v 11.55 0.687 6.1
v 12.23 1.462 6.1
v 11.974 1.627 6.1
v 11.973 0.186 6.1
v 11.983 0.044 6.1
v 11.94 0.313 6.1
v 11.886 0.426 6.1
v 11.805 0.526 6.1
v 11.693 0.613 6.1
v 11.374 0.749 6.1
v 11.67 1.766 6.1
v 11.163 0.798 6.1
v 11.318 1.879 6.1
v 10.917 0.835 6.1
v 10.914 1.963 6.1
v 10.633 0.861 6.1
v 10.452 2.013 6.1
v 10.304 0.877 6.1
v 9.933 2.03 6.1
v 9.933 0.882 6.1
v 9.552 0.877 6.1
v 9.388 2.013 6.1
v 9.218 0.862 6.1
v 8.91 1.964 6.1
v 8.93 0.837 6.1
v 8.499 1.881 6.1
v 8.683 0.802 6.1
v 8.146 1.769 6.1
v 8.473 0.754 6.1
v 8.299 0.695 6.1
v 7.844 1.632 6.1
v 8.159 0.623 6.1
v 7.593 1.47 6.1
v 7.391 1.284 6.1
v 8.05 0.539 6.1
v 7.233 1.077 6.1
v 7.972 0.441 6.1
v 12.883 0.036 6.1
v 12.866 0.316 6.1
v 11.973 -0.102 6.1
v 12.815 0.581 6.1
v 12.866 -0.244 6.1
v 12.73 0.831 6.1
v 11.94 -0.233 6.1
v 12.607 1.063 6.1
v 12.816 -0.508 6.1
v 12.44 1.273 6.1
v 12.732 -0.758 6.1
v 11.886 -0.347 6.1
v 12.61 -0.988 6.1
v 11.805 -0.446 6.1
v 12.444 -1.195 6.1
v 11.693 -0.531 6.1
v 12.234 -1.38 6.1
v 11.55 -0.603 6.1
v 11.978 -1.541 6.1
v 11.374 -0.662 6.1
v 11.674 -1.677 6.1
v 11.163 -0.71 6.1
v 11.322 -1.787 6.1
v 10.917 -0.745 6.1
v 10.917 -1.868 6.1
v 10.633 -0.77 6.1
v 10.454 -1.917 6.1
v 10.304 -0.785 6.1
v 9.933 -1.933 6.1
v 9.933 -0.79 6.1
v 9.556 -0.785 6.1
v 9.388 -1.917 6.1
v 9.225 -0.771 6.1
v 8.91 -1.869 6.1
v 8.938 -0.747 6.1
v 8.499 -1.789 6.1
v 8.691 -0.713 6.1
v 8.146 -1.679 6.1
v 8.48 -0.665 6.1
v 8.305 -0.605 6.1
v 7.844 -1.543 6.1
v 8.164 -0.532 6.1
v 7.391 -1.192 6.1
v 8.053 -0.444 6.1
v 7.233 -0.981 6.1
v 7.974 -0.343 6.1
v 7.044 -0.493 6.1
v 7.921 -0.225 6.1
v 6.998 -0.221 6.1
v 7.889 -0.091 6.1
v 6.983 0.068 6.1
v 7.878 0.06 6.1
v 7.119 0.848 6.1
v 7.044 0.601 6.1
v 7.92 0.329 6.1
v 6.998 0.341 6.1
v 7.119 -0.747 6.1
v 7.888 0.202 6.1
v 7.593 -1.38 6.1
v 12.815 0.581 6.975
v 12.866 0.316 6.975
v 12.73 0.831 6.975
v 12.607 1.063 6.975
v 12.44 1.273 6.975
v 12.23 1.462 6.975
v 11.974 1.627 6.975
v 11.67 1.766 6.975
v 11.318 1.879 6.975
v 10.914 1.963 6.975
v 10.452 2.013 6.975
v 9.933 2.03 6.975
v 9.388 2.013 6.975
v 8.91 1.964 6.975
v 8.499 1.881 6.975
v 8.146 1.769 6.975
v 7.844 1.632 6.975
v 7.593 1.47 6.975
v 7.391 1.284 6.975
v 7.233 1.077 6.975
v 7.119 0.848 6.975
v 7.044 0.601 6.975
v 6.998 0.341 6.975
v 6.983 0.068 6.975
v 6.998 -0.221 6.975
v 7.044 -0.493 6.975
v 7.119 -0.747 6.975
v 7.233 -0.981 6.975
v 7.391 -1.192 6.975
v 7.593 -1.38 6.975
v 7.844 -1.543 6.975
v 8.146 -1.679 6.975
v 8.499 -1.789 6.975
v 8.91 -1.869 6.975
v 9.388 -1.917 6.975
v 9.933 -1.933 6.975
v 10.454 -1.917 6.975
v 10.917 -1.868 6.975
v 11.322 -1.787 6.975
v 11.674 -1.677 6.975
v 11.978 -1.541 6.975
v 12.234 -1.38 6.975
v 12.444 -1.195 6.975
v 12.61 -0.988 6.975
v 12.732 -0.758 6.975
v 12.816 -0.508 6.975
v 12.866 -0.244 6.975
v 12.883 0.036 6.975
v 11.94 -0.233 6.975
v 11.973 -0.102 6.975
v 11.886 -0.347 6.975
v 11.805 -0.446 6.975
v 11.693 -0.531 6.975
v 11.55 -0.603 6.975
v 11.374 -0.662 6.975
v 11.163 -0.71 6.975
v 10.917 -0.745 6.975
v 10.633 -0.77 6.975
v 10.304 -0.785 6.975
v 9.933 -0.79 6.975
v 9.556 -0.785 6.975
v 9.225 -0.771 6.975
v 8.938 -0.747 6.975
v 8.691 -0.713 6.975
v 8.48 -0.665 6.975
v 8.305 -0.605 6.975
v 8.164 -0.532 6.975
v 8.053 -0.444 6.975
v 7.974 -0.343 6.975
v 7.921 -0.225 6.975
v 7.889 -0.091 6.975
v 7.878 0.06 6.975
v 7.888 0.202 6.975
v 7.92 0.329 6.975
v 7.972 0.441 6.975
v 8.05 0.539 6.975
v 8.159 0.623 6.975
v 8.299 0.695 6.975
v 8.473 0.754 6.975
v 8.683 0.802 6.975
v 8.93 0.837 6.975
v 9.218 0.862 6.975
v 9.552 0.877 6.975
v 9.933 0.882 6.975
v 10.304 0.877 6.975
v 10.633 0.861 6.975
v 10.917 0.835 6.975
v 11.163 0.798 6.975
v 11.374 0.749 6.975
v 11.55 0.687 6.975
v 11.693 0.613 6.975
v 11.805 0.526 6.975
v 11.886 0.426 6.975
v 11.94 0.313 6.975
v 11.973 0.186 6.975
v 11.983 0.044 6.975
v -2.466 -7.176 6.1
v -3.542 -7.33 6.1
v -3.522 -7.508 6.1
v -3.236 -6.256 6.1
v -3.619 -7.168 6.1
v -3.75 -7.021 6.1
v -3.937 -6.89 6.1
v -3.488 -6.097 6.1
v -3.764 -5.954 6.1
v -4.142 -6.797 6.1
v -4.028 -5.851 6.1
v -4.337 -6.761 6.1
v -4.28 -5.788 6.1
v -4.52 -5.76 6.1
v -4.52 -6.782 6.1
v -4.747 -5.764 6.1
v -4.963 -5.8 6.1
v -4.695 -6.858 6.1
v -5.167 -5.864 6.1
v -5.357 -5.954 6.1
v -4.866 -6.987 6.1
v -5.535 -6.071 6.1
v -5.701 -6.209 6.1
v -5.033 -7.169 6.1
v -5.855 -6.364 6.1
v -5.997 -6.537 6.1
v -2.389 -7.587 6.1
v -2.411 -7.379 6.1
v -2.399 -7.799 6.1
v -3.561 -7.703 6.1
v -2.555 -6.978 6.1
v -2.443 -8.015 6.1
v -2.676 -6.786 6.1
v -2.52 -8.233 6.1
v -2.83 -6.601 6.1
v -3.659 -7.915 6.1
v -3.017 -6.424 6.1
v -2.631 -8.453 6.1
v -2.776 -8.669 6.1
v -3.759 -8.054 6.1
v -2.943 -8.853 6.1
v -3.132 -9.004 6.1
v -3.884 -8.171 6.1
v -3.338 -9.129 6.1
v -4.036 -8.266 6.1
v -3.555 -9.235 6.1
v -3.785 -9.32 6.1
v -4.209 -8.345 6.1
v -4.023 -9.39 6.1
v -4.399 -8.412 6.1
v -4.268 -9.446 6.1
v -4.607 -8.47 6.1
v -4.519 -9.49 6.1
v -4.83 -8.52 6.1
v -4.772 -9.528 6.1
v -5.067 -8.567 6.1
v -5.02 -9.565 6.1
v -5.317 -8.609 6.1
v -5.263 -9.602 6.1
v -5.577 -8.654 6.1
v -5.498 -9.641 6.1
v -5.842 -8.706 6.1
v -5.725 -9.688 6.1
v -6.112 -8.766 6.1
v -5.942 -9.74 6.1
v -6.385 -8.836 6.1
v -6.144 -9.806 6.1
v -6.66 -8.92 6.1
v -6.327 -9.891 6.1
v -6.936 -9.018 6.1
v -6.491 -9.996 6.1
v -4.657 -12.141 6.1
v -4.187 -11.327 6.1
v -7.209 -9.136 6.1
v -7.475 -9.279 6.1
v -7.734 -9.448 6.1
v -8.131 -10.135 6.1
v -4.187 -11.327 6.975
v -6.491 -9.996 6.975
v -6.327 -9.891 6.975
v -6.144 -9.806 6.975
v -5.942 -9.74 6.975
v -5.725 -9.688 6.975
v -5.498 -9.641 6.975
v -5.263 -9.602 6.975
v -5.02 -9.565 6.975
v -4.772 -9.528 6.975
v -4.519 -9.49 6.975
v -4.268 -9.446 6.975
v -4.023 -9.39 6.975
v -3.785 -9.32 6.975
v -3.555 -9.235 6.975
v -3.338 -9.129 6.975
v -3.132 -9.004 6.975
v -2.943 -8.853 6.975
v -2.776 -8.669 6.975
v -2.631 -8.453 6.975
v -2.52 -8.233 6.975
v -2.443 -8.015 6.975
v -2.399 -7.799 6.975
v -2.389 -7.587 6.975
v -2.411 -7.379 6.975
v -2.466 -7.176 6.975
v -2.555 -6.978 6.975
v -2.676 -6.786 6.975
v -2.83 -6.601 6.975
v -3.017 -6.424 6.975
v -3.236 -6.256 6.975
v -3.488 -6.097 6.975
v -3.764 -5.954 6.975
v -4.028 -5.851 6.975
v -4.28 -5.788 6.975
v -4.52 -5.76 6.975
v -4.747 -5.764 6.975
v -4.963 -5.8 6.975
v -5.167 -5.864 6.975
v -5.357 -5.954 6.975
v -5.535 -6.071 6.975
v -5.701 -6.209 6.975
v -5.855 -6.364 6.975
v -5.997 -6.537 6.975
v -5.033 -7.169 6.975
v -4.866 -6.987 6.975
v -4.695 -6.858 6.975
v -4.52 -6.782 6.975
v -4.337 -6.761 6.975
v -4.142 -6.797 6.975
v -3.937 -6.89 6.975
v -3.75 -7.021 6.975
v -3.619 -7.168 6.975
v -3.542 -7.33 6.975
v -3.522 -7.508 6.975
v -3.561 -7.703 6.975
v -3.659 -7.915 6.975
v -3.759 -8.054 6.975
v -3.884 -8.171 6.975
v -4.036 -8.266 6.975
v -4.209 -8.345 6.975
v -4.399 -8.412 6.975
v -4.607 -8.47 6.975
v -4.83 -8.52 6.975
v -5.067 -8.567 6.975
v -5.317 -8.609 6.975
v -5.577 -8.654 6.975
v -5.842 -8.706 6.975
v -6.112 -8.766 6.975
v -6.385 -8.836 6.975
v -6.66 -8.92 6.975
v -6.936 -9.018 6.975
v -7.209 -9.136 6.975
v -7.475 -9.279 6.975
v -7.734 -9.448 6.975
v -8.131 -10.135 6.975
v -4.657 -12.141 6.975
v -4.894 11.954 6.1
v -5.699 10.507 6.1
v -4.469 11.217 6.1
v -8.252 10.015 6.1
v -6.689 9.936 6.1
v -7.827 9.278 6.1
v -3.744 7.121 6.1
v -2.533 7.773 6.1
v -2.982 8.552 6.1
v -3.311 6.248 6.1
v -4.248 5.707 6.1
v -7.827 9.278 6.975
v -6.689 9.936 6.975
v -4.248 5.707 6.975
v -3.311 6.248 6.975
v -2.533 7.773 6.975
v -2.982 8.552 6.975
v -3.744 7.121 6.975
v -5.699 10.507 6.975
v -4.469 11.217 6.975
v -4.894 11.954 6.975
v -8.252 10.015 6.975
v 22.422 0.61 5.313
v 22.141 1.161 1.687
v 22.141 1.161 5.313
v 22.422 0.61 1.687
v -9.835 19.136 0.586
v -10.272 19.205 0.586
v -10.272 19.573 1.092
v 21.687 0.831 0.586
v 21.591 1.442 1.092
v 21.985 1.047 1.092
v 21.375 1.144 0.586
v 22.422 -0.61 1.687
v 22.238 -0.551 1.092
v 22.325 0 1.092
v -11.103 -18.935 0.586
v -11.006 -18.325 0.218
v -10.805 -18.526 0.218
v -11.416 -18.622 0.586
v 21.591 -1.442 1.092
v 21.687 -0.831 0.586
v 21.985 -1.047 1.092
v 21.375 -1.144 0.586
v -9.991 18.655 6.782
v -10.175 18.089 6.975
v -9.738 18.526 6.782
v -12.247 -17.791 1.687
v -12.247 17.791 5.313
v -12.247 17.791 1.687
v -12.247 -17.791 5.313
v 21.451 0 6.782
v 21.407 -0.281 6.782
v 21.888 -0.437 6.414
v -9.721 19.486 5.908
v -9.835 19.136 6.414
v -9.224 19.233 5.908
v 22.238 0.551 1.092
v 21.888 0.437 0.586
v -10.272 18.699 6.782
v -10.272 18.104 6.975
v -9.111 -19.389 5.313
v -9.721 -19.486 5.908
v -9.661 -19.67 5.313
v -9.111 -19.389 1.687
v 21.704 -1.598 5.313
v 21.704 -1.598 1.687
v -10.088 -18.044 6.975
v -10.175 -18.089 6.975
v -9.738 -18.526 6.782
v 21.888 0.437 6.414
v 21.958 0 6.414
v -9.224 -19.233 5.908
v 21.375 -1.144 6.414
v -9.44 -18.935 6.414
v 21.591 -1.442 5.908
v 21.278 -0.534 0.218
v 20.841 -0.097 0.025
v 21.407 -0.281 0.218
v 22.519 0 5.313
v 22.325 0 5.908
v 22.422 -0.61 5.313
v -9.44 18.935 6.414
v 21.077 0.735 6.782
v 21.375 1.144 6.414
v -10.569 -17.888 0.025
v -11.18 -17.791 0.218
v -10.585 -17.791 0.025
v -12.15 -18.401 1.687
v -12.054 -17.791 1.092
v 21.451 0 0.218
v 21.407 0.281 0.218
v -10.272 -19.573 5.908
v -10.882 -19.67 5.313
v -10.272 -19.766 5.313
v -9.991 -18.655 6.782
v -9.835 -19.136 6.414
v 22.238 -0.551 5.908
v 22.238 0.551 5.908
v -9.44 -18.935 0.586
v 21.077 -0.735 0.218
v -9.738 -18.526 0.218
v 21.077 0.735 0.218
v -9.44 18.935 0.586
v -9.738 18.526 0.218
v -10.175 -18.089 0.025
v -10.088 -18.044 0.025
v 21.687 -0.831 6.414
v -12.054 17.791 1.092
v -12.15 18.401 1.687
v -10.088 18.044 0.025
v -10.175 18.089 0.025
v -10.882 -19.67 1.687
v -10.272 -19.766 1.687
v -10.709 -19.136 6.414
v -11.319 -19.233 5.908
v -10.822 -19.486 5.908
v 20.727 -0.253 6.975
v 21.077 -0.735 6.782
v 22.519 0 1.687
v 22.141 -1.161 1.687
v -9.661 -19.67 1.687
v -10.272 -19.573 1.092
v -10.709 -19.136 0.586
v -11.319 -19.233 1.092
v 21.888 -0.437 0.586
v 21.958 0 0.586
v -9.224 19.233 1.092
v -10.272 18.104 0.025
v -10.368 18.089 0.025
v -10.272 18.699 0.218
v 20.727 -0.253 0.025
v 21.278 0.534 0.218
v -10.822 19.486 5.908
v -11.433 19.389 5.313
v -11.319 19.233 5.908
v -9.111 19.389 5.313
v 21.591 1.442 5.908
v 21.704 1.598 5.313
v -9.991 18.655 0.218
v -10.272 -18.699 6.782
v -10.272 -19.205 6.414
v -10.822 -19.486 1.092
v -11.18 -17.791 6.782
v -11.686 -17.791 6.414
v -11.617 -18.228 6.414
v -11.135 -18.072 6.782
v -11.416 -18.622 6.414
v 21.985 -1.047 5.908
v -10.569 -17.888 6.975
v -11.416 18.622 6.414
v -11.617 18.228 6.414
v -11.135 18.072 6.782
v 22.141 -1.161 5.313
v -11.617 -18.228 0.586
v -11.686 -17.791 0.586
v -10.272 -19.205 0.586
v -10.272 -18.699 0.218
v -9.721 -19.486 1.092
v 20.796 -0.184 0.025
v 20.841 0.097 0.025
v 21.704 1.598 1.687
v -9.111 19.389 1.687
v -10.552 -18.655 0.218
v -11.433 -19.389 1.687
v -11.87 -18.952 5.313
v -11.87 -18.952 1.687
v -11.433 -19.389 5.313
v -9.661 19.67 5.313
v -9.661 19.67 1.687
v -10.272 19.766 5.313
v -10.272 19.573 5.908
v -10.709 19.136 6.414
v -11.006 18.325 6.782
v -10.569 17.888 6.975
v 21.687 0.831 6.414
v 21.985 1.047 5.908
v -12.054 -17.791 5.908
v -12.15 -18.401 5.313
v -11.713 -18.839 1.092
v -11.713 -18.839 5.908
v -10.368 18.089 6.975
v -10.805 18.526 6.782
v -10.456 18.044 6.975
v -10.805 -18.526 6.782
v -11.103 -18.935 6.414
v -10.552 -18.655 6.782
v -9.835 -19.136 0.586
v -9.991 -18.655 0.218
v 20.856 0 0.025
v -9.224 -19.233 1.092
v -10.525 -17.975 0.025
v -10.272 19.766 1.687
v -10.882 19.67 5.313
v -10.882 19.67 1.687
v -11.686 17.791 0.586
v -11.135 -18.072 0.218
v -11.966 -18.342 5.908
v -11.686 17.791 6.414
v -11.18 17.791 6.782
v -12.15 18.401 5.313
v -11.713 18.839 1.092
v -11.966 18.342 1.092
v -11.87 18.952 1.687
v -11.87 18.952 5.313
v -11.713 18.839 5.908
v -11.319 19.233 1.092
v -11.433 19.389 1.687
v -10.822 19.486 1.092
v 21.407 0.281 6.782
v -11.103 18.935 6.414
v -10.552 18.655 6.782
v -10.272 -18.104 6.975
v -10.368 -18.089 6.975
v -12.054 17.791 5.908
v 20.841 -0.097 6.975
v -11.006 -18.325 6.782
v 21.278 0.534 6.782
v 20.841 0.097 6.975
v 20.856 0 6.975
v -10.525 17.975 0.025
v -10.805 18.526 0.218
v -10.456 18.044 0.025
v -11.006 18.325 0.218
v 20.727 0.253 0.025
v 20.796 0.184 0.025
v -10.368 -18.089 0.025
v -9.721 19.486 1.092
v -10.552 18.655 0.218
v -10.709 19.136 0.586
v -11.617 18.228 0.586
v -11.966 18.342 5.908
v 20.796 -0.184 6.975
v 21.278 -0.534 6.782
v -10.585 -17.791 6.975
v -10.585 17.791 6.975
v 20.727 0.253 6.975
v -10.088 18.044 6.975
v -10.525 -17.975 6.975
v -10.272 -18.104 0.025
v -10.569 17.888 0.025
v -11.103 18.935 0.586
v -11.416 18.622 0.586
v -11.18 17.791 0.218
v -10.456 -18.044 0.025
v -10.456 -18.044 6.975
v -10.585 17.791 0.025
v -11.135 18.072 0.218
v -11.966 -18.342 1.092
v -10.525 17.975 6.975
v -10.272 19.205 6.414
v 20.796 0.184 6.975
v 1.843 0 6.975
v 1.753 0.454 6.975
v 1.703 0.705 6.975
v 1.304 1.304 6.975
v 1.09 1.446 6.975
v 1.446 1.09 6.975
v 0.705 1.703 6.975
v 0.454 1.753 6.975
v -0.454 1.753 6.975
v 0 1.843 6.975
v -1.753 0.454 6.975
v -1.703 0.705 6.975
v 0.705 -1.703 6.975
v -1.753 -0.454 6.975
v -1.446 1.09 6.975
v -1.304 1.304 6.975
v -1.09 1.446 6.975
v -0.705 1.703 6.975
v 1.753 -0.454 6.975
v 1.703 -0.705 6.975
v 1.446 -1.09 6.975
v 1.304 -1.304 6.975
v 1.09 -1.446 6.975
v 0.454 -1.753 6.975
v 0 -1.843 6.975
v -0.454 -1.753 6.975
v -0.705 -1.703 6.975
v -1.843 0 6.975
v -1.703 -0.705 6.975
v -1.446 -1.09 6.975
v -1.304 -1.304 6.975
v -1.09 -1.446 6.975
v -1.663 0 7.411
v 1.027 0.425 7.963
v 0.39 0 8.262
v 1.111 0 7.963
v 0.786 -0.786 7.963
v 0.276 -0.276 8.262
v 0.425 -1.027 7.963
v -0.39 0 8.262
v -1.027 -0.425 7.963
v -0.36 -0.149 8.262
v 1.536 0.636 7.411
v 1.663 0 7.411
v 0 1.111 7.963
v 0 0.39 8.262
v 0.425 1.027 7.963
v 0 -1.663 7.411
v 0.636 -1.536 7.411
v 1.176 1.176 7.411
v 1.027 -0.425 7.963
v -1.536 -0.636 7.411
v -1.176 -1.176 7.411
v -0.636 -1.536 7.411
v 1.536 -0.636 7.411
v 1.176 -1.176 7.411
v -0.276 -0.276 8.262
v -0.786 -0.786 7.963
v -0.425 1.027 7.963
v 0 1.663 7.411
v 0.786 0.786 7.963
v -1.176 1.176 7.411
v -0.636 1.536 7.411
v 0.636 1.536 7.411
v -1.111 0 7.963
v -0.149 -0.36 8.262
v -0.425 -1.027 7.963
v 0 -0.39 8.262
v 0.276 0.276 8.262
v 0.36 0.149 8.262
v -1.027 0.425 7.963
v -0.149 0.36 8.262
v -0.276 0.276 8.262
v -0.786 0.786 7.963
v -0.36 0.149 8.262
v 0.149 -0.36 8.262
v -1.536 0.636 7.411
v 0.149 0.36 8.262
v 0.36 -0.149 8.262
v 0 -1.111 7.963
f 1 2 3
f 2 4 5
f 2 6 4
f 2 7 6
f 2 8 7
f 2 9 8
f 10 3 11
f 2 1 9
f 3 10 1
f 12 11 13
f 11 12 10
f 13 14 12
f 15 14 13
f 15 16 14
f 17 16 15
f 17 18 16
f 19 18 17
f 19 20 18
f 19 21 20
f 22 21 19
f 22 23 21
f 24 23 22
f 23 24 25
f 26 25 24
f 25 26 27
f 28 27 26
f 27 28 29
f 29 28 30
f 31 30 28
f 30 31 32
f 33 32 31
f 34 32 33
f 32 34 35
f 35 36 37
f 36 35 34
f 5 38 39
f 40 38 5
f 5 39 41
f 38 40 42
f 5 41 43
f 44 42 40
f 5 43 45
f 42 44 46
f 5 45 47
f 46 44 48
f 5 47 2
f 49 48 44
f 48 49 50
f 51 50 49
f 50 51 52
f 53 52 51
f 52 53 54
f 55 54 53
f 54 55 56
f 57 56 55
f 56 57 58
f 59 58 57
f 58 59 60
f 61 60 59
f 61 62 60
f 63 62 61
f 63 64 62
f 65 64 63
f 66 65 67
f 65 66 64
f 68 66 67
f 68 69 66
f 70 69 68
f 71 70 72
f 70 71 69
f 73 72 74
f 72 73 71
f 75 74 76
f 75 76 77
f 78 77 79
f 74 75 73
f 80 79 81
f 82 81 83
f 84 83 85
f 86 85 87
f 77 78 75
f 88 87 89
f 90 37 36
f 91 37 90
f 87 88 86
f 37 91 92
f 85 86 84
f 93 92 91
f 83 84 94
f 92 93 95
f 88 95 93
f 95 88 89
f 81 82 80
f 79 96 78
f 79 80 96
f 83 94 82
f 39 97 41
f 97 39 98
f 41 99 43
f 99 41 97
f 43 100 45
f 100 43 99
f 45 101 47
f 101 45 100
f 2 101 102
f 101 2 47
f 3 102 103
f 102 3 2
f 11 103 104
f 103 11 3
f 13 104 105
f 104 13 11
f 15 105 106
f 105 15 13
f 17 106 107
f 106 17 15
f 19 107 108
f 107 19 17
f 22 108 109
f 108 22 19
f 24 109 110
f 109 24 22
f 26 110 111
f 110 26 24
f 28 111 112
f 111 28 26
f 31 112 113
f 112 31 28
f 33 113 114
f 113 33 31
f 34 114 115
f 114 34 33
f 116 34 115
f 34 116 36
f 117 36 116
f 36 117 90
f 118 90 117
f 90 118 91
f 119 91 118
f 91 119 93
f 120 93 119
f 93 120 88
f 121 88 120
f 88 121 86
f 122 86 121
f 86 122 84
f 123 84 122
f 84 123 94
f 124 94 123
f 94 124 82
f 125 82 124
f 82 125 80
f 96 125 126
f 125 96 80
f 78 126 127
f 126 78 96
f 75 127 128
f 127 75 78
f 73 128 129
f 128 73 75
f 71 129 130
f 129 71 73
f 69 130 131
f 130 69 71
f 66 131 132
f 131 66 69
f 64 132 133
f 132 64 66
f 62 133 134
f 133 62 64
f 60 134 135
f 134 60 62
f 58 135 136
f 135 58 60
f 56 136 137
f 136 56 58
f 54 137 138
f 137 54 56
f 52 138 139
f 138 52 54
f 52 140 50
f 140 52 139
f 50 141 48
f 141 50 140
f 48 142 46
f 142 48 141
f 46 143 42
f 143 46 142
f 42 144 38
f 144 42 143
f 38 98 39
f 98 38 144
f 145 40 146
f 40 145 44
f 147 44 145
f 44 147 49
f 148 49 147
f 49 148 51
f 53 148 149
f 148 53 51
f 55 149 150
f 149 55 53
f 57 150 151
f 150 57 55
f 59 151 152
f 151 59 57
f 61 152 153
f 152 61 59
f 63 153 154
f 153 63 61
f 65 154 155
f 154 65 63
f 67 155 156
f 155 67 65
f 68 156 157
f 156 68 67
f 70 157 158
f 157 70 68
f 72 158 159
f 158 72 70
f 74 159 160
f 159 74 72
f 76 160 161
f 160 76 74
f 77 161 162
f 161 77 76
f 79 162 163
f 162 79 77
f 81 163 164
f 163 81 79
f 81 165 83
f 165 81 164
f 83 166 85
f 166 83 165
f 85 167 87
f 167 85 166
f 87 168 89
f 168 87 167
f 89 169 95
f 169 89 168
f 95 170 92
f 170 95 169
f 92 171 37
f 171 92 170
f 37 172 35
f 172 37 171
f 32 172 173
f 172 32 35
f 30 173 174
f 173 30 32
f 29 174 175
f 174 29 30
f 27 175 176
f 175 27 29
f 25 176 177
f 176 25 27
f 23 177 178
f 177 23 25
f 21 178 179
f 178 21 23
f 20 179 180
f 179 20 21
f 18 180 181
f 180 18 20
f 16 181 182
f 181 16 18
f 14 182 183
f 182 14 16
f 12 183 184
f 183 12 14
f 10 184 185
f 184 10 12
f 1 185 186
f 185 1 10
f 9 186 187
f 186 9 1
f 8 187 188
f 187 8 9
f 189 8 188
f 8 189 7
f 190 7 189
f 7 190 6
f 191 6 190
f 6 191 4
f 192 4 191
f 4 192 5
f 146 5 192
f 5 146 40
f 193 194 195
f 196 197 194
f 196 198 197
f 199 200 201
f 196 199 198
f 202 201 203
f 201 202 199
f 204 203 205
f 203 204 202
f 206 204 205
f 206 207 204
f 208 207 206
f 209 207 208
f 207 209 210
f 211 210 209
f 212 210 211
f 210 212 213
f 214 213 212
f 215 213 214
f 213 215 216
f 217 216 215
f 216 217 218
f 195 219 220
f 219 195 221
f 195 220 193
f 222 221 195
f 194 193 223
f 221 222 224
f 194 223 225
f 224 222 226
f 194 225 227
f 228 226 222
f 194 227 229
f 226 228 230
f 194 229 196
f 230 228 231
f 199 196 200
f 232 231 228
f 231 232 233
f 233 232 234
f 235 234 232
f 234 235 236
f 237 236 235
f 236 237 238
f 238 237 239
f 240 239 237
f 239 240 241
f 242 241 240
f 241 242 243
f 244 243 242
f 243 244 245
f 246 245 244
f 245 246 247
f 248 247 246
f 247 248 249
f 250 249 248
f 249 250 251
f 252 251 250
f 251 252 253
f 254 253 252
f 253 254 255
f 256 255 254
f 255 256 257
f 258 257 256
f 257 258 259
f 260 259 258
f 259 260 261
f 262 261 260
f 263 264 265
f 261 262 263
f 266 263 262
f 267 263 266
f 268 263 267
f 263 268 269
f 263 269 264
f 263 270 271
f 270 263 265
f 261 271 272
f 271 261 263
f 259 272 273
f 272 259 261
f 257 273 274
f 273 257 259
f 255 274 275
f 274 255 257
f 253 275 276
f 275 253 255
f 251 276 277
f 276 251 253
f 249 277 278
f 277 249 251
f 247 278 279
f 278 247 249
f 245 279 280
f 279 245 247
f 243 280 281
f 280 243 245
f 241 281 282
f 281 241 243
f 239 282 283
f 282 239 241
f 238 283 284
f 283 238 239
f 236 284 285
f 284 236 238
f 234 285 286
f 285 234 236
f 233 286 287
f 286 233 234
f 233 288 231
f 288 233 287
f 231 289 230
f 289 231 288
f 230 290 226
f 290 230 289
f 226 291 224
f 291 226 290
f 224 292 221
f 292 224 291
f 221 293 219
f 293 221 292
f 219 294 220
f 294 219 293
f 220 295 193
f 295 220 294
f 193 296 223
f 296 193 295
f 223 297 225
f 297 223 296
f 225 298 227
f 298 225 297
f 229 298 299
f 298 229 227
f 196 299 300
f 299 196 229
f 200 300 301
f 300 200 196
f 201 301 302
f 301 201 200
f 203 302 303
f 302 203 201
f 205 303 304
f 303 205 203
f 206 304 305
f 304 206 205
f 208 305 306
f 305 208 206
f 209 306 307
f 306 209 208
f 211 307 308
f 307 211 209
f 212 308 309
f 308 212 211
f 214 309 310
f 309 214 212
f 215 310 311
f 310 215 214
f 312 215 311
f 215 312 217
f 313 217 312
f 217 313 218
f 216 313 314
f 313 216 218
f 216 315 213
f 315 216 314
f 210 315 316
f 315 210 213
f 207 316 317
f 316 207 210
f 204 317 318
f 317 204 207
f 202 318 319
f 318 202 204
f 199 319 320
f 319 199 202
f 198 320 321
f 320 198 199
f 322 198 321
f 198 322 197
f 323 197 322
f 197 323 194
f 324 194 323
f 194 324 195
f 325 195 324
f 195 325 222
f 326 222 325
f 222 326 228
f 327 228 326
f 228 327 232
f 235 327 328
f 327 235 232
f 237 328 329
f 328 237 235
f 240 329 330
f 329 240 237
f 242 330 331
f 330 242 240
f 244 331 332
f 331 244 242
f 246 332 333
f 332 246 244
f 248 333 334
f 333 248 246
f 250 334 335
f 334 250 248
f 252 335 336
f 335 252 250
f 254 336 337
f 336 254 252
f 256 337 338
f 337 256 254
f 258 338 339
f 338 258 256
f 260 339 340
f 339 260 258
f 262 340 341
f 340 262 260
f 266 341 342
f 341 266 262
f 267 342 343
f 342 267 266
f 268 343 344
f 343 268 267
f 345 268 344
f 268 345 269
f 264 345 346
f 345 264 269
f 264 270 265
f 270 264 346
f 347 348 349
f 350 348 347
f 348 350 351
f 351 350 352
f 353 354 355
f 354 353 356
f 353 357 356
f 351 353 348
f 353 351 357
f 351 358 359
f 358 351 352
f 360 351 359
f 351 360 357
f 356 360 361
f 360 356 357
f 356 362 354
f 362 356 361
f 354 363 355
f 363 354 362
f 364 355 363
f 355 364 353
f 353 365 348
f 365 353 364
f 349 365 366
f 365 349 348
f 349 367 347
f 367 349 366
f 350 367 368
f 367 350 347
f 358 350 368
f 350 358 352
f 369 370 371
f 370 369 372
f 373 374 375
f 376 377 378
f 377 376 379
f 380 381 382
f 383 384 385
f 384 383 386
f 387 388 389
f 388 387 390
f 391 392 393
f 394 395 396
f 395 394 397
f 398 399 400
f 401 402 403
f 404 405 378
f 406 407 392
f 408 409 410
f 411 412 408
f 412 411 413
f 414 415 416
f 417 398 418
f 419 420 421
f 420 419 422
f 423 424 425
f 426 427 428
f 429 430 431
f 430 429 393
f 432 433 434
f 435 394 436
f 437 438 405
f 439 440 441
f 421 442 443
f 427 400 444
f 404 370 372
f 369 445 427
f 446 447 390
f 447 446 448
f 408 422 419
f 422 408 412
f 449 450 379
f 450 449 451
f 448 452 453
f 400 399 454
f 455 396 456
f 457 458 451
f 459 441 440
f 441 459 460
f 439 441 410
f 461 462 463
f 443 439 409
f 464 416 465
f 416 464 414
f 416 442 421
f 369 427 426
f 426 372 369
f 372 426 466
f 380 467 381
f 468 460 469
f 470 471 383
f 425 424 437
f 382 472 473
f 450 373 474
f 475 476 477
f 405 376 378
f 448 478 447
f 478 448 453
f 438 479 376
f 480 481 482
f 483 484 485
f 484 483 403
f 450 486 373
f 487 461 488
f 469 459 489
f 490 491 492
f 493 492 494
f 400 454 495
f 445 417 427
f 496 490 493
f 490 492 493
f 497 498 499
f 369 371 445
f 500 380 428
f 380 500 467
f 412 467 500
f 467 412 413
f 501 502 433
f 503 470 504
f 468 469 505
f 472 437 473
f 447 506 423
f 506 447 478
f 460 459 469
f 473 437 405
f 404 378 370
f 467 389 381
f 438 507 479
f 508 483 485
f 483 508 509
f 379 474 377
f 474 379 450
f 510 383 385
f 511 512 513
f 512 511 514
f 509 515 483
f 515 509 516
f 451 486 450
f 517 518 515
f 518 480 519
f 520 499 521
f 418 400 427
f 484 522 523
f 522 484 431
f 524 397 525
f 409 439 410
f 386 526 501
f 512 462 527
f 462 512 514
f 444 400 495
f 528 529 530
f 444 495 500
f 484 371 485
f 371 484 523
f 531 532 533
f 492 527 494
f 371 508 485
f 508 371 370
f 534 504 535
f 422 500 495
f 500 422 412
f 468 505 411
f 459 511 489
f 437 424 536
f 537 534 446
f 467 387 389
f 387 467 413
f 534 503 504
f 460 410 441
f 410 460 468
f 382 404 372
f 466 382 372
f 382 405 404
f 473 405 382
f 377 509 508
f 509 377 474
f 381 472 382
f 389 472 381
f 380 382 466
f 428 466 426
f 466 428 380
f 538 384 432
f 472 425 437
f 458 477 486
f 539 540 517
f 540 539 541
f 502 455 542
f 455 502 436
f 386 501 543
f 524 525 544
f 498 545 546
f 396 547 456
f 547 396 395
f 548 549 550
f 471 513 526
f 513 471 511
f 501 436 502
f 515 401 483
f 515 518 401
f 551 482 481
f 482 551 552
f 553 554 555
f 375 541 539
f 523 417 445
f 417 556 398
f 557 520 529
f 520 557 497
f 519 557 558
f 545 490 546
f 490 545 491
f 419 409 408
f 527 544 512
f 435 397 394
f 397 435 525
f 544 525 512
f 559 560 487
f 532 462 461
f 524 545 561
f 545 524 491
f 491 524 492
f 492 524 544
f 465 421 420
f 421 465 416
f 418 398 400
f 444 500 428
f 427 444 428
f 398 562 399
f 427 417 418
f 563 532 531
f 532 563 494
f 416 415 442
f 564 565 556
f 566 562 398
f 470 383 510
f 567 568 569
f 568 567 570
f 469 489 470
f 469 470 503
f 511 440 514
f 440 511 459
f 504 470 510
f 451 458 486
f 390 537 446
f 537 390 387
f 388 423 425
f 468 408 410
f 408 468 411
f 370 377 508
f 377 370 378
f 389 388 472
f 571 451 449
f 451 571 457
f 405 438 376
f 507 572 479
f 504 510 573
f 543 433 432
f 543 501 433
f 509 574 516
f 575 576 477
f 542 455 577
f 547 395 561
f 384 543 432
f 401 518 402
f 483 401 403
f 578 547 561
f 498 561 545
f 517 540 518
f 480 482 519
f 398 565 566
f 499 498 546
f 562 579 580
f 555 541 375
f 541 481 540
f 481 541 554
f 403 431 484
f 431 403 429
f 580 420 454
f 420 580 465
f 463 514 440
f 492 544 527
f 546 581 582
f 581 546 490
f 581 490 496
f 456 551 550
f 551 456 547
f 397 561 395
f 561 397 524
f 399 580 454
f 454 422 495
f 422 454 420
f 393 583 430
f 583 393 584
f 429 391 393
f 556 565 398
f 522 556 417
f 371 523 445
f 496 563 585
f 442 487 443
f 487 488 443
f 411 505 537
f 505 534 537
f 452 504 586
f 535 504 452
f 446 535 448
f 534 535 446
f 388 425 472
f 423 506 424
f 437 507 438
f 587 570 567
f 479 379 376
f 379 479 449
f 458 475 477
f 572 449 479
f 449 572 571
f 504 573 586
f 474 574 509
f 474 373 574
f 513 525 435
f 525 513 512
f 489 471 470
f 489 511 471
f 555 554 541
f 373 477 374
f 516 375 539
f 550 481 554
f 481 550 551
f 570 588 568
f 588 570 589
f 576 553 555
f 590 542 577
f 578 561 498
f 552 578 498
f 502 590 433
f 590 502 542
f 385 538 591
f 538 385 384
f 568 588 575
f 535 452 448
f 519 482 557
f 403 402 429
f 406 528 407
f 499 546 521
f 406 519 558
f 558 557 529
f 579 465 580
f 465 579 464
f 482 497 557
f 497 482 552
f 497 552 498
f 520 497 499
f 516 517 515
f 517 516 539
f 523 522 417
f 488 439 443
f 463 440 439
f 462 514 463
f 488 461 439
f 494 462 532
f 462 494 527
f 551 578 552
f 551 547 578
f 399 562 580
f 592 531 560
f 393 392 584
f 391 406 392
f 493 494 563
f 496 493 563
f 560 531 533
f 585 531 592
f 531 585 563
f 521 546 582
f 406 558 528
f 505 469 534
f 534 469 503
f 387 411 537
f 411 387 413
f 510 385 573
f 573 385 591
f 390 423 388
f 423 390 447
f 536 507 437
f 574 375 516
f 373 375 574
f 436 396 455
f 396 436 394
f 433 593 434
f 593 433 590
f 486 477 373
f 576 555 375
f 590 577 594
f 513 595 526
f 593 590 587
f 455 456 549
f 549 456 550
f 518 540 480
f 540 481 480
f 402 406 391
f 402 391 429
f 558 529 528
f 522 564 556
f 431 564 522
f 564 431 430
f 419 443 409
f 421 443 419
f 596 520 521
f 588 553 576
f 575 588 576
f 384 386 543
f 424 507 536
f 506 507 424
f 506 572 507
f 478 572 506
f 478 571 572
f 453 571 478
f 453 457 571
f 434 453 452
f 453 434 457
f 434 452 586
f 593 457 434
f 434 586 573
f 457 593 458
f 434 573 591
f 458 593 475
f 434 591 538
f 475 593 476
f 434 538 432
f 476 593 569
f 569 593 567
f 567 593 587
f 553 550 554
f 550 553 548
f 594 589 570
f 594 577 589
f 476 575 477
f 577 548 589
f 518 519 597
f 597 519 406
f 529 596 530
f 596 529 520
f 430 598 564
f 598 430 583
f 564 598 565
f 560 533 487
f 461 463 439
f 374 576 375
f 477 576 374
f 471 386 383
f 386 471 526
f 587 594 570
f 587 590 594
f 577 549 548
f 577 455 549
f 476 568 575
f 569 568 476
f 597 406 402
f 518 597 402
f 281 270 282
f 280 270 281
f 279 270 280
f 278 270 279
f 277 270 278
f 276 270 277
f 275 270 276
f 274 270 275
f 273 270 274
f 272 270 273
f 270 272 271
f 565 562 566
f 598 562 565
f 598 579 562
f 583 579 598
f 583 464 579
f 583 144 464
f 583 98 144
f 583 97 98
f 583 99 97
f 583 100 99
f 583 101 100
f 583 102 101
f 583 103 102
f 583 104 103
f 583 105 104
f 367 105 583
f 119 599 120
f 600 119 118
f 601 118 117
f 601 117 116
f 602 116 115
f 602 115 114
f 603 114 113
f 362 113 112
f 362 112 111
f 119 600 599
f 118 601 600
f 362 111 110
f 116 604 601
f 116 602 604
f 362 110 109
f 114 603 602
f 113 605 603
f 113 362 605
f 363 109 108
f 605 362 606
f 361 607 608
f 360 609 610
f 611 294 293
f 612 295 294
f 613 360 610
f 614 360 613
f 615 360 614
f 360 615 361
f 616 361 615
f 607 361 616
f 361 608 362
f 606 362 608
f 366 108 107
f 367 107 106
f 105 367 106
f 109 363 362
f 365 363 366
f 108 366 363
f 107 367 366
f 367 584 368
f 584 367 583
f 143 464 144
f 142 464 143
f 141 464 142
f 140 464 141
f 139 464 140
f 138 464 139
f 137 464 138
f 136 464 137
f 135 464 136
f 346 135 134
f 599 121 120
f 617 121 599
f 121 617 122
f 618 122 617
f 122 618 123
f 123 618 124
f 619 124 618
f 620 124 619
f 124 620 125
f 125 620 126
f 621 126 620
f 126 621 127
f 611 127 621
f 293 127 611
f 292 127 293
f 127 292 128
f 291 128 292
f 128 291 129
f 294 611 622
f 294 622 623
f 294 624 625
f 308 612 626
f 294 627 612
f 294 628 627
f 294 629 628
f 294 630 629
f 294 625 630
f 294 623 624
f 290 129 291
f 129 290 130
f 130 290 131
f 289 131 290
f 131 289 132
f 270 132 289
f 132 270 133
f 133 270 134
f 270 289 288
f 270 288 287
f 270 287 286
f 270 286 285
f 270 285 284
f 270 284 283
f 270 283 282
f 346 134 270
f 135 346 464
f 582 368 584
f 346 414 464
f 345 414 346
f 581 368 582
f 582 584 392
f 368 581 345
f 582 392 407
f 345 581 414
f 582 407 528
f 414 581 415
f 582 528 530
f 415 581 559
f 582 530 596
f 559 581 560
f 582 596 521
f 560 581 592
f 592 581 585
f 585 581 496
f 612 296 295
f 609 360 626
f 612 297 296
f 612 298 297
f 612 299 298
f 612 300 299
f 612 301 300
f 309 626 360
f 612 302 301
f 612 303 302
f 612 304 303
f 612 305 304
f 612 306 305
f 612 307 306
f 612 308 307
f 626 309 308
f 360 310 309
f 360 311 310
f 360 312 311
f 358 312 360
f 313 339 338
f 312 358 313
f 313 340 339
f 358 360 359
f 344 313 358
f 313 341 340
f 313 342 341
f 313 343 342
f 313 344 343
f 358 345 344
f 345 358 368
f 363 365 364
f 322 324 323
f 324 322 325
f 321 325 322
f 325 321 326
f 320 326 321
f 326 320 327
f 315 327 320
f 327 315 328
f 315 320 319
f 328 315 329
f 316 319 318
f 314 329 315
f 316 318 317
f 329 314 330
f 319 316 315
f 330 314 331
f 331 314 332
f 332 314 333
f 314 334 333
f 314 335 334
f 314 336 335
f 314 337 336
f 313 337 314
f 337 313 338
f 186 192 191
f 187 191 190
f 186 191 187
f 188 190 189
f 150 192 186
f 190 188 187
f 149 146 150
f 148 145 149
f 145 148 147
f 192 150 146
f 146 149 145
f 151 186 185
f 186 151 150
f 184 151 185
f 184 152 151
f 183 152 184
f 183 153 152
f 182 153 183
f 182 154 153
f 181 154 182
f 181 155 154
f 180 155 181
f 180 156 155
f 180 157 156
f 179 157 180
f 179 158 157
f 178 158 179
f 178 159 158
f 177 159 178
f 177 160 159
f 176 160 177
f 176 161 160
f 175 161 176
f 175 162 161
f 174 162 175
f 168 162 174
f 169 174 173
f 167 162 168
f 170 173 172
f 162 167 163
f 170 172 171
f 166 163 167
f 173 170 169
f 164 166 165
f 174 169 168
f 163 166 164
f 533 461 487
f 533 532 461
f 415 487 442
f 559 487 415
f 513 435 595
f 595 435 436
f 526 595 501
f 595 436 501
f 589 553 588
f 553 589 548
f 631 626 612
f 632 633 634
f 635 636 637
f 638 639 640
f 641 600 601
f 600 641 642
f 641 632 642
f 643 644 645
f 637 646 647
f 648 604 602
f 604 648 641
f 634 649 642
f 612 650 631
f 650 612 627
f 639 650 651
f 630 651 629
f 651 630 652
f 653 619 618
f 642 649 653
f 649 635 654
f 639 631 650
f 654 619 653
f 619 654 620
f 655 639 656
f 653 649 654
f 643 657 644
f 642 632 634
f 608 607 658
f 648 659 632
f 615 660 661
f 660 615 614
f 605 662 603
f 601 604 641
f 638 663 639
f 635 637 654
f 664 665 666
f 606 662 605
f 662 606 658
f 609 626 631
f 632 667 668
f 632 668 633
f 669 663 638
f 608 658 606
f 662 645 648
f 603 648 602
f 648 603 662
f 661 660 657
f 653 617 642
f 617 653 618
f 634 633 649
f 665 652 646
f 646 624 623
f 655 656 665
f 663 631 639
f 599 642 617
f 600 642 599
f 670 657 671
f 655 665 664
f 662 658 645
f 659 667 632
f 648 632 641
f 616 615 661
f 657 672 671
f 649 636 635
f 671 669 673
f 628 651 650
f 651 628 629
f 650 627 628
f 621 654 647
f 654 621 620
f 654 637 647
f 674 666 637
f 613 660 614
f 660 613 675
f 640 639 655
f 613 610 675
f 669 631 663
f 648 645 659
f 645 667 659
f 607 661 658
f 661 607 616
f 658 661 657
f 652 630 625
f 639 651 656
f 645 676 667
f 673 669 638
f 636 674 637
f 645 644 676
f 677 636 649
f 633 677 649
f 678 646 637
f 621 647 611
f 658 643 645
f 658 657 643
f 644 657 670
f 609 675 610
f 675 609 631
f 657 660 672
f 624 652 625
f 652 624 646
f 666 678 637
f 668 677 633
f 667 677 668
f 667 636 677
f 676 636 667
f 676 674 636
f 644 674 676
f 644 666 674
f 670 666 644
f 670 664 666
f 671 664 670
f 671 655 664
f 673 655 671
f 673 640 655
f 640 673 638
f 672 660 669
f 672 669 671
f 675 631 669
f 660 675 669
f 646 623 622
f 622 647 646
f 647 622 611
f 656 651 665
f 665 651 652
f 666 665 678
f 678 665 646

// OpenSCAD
PIECE = 0; // [0:19]

module __Customizer_Limit__ () {}

SIZE = 39;
THICKNESS = 7;
ROUNDING = 2;
EMBOSS = 1;

EPSILON = 0.1;

module digit(n, pos) {
    rotate([0, 0, - pos * 120])
    rotate([0, 0, -90])
    translate([0, 10, THICKNESS - EMBOSS + EPSILON])
    linear_extrude(EMBOSS)
    rotate([0, 0, 180])
    text(str(n), size=6, font="Arial:style=Bold", halign="center", valign="center");
}

module tri(a, b, c) {
    difference() {
        triangle();
        union() {
            digit(a, 0);
            digit(b, 1);
            digit(c, 2);
        }
    }
    translate([0, 0, THICKNESS - 0.7])
        sphere(r=2, $fn=16);
}

module triangle() {
    translate([0, 0, ROUNDING])
    minkowski() {
        cylinder(h=THICKNESS - ROUNDING * 2, r=(SIZE/1.73 - ROUNDING), $fn=3);
        sphere(r=ROUNDING, $fn=20);
    };
}

missing = [
    [0, 2, 1],
    [0, 3, 1], [0, 3, 2],
    [0, 4, 1], [0, 4, 2], [0, 4, 3],
    [0, 5, 1], [0, 5, 2], [0, 5, 3], [0, 5, 4],

    [1, 3, 2],
    [1, 4, 2], [1, 4, 3],
    [1, 5, 2], [1, 5, 3], [1, 5, 4],
  
    [2, 4, 3],
    [2, 5, 3], [2, 5, 4],

    [3, 5, 4]
];
    

tri(missing[PIECE][0], missing[PIECE][1], missing[PIECE][2]);
